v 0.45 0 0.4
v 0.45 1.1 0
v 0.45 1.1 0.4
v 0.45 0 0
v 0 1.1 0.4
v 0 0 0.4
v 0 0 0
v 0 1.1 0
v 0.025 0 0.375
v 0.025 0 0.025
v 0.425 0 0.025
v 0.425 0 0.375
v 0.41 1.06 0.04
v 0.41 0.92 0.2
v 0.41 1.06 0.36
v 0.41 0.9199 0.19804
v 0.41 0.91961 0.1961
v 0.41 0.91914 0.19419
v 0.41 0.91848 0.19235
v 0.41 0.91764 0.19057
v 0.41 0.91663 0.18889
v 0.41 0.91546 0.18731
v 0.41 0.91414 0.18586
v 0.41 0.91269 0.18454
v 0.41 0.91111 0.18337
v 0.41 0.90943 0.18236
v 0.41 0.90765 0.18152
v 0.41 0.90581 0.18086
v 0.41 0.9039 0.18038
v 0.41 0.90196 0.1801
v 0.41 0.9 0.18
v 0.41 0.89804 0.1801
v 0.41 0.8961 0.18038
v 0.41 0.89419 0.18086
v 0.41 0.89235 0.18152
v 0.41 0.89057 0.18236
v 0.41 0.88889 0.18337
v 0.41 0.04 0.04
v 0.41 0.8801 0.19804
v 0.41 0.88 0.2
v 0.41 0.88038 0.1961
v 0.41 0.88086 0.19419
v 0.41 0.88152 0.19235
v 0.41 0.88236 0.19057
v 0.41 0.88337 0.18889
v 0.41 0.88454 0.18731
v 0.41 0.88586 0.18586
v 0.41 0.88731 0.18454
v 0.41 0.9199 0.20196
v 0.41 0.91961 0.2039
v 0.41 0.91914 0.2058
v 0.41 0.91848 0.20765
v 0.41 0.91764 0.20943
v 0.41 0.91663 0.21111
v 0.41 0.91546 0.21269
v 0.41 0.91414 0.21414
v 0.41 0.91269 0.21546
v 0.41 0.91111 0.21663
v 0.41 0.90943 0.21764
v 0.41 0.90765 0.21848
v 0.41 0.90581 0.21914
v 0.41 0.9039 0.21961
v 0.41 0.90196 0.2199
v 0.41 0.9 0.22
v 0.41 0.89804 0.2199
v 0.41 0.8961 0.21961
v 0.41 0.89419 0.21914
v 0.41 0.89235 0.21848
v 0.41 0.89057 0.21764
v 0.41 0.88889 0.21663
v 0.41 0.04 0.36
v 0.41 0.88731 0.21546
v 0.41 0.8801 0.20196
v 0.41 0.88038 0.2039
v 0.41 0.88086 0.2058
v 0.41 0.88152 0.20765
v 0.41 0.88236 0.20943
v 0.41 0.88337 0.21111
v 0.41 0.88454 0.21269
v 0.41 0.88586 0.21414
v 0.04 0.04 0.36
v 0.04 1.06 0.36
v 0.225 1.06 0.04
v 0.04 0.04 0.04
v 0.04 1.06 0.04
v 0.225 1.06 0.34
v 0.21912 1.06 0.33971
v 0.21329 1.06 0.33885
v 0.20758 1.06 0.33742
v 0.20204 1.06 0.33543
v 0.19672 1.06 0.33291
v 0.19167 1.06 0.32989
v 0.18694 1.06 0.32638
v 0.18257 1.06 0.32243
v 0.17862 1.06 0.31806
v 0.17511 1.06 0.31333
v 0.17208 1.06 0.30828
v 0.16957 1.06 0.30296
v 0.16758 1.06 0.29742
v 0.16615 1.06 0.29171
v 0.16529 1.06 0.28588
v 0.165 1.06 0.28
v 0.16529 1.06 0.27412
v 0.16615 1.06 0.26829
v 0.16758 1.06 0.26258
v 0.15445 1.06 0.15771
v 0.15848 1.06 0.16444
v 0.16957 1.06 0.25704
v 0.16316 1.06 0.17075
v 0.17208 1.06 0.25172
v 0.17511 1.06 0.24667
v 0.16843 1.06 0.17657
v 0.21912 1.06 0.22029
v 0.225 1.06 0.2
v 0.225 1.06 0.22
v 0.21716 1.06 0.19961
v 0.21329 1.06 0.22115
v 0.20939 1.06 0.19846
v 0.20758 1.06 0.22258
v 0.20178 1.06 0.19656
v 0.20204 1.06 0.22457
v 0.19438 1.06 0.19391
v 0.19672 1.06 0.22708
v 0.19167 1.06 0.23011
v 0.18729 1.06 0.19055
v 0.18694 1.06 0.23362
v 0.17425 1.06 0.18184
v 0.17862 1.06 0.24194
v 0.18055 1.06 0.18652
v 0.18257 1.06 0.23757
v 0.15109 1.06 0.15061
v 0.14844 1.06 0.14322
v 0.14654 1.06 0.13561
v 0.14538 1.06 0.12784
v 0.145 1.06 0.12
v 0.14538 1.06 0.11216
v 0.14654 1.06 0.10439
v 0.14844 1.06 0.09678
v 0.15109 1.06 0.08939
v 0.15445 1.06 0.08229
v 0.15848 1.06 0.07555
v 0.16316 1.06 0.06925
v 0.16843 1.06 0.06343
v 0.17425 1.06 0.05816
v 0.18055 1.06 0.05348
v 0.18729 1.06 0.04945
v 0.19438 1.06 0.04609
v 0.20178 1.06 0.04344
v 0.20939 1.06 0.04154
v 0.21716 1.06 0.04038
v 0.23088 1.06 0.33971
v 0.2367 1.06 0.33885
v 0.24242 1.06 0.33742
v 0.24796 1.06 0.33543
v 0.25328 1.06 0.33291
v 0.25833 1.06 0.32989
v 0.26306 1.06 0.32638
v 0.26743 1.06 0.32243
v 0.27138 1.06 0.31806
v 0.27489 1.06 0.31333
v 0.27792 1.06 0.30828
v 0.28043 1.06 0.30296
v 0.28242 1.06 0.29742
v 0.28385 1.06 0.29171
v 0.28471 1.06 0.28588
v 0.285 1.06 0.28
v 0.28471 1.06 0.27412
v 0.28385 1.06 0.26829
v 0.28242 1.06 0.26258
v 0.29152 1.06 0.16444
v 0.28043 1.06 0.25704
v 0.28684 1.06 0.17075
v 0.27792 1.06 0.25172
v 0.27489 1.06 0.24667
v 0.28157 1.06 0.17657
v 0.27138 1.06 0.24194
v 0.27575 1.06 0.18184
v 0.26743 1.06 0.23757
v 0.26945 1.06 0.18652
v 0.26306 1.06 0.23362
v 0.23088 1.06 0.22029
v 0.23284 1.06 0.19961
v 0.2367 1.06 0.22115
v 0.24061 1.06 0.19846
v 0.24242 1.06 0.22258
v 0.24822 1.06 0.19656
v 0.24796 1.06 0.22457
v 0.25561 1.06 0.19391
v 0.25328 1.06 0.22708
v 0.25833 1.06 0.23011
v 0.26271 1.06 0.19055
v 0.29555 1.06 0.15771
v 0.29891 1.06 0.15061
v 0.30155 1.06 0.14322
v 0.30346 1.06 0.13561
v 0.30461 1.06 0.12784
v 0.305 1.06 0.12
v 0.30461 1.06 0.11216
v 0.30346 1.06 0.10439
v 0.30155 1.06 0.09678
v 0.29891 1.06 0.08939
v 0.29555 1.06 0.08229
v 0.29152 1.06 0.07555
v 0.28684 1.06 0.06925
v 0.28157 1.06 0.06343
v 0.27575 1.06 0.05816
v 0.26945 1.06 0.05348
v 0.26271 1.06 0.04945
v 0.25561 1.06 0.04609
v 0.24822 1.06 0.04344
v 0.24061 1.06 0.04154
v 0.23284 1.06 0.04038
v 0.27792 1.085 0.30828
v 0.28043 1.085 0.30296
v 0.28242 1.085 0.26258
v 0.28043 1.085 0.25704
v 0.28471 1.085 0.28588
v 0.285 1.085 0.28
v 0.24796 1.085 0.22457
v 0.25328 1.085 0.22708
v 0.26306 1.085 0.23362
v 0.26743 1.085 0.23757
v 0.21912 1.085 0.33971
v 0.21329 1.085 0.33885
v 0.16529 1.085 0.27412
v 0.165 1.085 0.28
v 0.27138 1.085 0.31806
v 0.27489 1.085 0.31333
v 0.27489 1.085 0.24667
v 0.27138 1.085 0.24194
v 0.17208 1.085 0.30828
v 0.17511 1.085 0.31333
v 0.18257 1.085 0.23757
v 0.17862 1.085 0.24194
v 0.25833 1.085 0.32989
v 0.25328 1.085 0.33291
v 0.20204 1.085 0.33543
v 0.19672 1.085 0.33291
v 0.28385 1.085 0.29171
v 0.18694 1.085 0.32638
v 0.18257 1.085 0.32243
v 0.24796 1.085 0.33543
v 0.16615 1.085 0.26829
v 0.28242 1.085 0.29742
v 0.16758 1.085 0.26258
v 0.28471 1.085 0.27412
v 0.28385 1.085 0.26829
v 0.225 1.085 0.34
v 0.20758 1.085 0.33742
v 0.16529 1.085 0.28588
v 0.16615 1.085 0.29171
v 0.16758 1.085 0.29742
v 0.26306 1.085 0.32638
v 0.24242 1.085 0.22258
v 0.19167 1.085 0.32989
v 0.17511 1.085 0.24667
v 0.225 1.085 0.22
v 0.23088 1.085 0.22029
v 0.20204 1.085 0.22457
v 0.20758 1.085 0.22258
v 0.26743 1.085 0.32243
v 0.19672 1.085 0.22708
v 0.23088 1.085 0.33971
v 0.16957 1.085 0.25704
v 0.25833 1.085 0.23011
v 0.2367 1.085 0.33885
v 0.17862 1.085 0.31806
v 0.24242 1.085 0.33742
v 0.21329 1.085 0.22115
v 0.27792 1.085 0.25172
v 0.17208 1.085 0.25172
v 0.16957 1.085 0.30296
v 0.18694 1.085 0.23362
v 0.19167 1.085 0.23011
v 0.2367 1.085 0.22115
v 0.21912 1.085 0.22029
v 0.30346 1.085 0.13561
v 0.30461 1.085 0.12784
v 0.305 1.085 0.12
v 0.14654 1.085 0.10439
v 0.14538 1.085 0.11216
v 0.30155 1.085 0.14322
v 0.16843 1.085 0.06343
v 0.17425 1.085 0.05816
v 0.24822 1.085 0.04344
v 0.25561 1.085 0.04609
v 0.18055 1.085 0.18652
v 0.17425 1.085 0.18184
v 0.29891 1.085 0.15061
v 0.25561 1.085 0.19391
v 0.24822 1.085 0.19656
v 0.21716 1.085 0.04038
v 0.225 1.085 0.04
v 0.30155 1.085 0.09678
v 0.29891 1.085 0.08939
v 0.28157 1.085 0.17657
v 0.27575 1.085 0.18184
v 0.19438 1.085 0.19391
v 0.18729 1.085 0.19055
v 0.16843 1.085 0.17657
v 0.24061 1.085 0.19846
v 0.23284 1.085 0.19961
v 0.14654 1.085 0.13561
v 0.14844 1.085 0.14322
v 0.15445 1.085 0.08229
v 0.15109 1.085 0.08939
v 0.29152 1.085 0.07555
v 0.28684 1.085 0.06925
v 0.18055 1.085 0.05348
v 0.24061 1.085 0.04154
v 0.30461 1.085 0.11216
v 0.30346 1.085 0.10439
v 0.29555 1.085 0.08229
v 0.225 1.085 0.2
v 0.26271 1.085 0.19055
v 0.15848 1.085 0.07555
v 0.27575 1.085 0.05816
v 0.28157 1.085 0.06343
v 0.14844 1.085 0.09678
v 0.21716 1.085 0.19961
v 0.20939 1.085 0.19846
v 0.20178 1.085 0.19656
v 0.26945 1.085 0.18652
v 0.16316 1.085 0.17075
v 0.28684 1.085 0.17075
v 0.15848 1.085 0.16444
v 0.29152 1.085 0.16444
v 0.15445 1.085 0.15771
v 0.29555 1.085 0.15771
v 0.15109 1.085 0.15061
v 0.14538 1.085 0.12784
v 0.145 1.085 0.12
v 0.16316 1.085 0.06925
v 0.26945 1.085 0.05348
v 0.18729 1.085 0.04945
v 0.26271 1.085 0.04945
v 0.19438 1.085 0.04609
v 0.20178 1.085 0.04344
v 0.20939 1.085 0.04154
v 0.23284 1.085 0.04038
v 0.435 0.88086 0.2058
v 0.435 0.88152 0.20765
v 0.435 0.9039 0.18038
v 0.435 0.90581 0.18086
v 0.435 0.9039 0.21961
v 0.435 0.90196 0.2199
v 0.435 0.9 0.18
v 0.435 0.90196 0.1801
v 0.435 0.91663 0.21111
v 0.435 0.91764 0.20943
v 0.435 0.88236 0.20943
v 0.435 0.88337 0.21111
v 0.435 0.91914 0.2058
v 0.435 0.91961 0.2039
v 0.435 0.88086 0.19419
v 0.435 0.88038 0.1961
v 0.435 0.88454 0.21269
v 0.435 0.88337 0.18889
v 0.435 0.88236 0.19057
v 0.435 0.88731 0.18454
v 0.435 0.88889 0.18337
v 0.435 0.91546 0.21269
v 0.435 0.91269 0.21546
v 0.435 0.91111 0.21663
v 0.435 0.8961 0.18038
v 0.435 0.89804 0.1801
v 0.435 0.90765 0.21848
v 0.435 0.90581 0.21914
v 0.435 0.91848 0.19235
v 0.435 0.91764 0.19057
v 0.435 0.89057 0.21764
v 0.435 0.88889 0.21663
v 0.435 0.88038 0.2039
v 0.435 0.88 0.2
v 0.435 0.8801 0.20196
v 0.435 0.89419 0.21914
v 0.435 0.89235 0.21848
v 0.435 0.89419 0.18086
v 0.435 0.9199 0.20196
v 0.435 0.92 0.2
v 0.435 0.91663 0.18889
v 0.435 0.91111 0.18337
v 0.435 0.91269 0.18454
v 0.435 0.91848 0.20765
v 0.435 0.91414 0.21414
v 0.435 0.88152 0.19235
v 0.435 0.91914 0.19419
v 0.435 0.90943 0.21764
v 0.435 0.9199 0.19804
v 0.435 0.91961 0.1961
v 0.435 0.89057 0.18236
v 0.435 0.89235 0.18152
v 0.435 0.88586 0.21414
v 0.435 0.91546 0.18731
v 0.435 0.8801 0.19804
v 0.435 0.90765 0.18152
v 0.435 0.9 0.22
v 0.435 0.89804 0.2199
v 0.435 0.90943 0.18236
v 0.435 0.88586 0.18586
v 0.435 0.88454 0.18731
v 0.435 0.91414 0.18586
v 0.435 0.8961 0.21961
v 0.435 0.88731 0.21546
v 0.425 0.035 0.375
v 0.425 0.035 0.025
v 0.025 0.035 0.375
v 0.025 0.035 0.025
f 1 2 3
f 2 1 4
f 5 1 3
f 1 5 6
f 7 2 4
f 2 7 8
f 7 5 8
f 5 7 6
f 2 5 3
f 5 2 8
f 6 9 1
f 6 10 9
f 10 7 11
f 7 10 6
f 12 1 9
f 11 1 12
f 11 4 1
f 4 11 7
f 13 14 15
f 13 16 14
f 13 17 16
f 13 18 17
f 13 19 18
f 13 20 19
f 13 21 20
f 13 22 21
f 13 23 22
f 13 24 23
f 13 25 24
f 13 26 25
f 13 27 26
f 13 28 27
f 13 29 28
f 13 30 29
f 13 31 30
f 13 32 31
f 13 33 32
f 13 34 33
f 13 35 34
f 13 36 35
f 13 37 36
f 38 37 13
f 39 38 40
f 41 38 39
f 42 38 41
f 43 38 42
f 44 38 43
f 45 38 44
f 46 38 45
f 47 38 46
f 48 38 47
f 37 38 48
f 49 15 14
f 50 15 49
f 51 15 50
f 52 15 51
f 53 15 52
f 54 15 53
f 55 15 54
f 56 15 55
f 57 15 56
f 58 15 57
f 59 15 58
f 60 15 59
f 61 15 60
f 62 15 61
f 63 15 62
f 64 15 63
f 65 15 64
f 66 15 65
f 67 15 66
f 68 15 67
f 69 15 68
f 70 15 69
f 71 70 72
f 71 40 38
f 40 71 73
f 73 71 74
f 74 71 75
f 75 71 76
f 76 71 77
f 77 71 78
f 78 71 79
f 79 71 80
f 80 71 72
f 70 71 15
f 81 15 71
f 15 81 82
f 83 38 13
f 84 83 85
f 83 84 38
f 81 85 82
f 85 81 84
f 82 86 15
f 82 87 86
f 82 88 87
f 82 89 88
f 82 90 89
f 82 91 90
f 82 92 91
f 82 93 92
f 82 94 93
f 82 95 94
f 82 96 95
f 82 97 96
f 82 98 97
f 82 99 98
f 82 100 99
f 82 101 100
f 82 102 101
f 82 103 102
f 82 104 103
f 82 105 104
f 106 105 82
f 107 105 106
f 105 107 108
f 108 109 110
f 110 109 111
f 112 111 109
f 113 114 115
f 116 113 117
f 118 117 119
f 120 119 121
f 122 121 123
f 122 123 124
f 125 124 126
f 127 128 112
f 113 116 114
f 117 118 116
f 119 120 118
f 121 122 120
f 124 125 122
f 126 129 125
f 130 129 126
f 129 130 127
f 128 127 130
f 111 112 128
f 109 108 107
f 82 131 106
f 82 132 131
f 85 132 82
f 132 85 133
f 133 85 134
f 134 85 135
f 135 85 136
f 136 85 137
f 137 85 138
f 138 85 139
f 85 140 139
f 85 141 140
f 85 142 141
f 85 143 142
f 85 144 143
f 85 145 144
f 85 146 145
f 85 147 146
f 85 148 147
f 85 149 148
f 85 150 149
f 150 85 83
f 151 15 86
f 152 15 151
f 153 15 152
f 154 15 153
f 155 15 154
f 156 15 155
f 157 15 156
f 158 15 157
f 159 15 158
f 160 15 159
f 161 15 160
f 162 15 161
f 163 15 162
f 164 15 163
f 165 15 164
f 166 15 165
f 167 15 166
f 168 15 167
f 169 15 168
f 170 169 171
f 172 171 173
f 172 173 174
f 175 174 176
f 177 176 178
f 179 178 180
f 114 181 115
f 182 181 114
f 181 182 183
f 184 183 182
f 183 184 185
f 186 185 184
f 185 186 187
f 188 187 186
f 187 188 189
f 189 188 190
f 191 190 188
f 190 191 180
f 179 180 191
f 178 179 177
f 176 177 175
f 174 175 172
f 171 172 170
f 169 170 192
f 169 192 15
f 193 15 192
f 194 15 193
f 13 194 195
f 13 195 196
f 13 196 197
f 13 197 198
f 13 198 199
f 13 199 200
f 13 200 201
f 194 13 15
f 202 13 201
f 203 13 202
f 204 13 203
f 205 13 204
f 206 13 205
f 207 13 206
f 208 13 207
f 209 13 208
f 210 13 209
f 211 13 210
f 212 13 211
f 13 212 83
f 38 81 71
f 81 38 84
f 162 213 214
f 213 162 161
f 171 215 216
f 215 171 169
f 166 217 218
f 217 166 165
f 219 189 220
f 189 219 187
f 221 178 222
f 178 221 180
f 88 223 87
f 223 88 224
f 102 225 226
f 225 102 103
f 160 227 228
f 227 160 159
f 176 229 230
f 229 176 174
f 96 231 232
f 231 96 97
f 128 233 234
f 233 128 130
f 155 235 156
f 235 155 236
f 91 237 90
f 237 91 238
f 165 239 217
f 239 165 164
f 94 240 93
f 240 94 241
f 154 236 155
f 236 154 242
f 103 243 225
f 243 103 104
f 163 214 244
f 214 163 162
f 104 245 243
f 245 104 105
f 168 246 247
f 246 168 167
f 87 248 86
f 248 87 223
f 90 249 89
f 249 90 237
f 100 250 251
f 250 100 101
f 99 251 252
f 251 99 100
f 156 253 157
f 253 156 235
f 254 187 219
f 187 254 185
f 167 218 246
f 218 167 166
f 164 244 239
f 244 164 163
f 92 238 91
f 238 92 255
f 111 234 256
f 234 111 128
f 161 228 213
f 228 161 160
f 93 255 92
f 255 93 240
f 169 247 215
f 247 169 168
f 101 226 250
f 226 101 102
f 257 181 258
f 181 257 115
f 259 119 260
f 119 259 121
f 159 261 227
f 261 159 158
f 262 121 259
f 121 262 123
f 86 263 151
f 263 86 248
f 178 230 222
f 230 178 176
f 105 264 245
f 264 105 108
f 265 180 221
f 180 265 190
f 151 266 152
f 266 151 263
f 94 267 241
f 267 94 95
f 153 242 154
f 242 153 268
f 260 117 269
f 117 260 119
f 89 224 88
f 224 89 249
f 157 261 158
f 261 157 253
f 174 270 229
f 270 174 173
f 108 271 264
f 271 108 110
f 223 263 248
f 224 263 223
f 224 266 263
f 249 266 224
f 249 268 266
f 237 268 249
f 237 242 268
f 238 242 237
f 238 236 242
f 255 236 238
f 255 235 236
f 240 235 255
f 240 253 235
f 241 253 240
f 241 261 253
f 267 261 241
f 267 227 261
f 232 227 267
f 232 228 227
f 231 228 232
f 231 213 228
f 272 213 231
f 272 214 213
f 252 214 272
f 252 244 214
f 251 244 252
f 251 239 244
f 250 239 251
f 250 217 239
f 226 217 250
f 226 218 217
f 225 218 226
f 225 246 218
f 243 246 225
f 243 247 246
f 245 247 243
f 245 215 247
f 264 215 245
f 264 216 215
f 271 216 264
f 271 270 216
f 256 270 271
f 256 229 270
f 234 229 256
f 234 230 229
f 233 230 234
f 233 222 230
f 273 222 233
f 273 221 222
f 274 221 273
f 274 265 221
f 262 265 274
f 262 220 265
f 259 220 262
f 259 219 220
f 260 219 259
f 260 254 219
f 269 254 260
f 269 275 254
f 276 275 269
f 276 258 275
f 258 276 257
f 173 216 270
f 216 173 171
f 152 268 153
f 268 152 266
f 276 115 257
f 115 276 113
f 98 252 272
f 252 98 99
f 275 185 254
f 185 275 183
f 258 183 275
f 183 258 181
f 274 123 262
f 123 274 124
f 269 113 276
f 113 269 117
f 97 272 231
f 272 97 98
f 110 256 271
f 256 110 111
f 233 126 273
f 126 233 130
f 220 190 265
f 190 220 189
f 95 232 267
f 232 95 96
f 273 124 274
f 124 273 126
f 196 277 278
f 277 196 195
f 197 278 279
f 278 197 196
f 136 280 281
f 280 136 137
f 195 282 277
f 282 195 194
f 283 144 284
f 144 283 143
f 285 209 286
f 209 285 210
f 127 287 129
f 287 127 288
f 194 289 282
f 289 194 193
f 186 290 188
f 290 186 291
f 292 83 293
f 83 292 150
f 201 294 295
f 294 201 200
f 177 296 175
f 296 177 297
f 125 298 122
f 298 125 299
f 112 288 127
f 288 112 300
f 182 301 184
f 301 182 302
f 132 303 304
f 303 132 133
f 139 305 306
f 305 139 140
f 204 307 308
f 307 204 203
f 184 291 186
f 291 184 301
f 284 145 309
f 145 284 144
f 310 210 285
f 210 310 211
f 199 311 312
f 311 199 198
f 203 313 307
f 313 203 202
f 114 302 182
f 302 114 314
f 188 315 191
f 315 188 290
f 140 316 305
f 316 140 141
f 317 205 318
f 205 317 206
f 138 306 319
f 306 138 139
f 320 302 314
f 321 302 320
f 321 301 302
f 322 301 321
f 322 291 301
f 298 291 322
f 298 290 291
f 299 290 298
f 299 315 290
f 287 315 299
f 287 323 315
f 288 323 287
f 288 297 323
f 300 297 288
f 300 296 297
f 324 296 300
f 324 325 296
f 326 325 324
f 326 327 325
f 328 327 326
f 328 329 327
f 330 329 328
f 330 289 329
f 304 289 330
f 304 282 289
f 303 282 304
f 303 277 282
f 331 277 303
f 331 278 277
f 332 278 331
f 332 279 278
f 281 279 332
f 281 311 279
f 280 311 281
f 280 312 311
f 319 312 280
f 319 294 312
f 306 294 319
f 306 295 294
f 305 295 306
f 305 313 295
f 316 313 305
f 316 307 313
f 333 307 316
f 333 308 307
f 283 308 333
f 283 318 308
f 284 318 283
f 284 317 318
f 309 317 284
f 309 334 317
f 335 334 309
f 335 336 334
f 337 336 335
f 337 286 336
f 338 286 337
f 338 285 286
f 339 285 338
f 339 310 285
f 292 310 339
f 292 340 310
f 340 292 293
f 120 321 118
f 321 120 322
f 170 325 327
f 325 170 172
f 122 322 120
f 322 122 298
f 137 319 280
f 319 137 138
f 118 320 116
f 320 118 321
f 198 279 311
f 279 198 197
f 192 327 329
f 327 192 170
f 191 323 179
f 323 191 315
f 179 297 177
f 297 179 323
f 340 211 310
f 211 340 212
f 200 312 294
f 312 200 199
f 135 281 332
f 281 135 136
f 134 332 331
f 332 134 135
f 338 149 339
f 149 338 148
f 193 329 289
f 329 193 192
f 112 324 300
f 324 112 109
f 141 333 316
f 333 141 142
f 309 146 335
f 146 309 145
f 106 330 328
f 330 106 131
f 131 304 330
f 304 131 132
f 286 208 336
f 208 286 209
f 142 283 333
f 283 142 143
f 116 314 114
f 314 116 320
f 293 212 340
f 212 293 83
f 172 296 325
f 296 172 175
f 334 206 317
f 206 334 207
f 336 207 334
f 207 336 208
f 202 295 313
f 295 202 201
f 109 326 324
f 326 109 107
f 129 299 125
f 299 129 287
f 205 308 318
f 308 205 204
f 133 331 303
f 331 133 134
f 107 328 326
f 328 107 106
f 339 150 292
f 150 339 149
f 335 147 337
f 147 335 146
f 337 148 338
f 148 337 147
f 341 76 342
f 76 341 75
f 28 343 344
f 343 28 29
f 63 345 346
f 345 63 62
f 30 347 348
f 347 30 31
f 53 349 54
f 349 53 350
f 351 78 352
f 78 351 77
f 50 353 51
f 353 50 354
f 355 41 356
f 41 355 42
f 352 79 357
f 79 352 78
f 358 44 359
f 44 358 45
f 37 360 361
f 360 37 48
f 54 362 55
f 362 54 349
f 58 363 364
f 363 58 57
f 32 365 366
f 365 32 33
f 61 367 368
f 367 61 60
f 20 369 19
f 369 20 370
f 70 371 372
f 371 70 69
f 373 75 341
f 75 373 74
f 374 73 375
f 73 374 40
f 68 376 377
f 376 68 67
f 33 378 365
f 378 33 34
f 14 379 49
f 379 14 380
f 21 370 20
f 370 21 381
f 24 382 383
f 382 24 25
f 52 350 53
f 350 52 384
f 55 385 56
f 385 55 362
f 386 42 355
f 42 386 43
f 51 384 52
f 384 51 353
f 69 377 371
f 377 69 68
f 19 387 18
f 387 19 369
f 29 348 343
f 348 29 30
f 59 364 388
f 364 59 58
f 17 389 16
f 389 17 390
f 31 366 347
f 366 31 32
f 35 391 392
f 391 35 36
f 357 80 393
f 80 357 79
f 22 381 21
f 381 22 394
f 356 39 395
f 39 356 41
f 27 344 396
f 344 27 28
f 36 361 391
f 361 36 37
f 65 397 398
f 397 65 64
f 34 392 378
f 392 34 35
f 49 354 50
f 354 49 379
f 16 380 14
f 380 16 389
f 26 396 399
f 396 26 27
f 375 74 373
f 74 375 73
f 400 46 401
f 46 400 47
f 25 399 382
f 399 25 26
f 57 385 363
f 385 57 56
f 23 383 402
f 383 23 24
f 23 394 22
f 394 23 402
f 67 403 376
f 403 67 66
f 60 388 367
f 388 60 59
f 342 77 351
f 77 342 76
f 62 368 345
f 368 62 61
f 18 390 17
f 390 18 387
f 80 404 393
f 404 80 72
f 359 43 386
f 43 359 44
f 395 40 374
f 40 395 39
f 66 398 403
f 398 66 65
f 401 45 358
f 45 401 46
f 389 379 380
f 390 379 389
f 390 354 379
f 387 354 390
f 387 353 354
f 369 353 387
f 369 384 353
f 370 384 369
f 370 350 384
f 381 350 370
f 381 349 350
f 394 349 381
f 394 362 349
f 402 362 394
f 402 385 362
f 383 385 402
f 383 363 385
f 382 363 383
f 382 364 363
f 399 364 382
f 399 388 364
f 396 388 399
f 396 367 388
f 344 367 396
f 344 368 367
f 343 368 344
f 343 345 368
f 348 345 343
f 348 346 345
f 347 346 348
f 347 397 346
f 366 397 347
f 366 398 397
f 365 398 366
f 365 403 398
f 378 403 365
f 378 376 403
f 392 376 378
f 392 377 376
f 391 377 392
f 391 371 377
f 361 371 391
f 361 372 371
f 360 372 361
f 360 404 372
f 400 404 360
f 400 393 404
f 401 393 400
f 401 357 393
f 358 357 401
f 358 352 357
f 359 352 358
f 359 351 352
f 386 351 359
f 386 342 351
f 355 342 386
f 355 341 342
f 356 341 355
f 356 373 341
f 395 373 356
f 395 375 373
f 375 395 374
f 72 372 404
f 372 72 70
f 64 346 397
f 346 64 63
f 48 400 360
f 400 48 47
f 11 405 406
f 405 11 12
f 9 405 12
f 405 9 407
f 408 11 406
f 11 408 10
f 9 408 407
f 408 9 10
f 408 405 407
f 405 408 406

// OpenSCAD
// Industrial Multi-Sensor Micro-Dongle Enclosure
$fn = 64;

// Enclosure Dimensions (Thumb-stick form factor)
dongle_width  = 0.45; // Inches (Fits cleanly into the 45° corner block port)
dongle_length = 1.10; // Inches
dongle_height = 0.40; // Inches
wall_thick    = 0.04; // 1mm protective shell

module sensor_dongle_chassis() {
    difference() {
        // 1. Core Exterior Shell Body
        cube([dongle_width, dongle_length, dongle_height]);
        
        // 2. Internal Component Cavity (Protects PCB and sensors)
        translate([wall_thick, wall_thick, wall_thick])
            cube([dongle_width - (wall_thick * 2), dongle_length - (wall_thick * 2), dongle_height - (wall_thick * 2)]);
            
        // 3. Front Optical Lens Window (Camera Aperture)
        translate([dongle_width / 2, dongle_length - wall_thick - 0.02, dongle_height * 0.7])
            rotate([90, 0, 0])
                cylinder(h = wall_thick + 0.05, d = 0.12, center = true);
                
        // 4. Infrared Lens Window (Flir Lepton / Heat Sensor Aperture)
        translate([dongle_width / 2, dongle_length - wall_thick - 0.02, dongle_height * 0.3])
            rotate([90, 0, 0])
                cylinder(h = wall_thick + 0.05, d = 0.16, center = true);
                
        // 5. Acoustic Port Entry (MEMS Microphone Port Hole)
        translate([dongle_width - wall_thick - 0.02, dongle_length - 0.2, dongle_height / 2])
            rotate([0, 90, 0])
                cylinder(h = wall_thick + 0.05, d = 0.04, center = true);
                
        // 6. Rear USB-B Standard Male Interface Connector Output Slot
        translate([dongle_width / 2, -0.01, dongle_height / 2])
            cube([0.40, wall_thick + 0.05, 0.35], center = true);
    }
}

sensor_dongle_chassis();
